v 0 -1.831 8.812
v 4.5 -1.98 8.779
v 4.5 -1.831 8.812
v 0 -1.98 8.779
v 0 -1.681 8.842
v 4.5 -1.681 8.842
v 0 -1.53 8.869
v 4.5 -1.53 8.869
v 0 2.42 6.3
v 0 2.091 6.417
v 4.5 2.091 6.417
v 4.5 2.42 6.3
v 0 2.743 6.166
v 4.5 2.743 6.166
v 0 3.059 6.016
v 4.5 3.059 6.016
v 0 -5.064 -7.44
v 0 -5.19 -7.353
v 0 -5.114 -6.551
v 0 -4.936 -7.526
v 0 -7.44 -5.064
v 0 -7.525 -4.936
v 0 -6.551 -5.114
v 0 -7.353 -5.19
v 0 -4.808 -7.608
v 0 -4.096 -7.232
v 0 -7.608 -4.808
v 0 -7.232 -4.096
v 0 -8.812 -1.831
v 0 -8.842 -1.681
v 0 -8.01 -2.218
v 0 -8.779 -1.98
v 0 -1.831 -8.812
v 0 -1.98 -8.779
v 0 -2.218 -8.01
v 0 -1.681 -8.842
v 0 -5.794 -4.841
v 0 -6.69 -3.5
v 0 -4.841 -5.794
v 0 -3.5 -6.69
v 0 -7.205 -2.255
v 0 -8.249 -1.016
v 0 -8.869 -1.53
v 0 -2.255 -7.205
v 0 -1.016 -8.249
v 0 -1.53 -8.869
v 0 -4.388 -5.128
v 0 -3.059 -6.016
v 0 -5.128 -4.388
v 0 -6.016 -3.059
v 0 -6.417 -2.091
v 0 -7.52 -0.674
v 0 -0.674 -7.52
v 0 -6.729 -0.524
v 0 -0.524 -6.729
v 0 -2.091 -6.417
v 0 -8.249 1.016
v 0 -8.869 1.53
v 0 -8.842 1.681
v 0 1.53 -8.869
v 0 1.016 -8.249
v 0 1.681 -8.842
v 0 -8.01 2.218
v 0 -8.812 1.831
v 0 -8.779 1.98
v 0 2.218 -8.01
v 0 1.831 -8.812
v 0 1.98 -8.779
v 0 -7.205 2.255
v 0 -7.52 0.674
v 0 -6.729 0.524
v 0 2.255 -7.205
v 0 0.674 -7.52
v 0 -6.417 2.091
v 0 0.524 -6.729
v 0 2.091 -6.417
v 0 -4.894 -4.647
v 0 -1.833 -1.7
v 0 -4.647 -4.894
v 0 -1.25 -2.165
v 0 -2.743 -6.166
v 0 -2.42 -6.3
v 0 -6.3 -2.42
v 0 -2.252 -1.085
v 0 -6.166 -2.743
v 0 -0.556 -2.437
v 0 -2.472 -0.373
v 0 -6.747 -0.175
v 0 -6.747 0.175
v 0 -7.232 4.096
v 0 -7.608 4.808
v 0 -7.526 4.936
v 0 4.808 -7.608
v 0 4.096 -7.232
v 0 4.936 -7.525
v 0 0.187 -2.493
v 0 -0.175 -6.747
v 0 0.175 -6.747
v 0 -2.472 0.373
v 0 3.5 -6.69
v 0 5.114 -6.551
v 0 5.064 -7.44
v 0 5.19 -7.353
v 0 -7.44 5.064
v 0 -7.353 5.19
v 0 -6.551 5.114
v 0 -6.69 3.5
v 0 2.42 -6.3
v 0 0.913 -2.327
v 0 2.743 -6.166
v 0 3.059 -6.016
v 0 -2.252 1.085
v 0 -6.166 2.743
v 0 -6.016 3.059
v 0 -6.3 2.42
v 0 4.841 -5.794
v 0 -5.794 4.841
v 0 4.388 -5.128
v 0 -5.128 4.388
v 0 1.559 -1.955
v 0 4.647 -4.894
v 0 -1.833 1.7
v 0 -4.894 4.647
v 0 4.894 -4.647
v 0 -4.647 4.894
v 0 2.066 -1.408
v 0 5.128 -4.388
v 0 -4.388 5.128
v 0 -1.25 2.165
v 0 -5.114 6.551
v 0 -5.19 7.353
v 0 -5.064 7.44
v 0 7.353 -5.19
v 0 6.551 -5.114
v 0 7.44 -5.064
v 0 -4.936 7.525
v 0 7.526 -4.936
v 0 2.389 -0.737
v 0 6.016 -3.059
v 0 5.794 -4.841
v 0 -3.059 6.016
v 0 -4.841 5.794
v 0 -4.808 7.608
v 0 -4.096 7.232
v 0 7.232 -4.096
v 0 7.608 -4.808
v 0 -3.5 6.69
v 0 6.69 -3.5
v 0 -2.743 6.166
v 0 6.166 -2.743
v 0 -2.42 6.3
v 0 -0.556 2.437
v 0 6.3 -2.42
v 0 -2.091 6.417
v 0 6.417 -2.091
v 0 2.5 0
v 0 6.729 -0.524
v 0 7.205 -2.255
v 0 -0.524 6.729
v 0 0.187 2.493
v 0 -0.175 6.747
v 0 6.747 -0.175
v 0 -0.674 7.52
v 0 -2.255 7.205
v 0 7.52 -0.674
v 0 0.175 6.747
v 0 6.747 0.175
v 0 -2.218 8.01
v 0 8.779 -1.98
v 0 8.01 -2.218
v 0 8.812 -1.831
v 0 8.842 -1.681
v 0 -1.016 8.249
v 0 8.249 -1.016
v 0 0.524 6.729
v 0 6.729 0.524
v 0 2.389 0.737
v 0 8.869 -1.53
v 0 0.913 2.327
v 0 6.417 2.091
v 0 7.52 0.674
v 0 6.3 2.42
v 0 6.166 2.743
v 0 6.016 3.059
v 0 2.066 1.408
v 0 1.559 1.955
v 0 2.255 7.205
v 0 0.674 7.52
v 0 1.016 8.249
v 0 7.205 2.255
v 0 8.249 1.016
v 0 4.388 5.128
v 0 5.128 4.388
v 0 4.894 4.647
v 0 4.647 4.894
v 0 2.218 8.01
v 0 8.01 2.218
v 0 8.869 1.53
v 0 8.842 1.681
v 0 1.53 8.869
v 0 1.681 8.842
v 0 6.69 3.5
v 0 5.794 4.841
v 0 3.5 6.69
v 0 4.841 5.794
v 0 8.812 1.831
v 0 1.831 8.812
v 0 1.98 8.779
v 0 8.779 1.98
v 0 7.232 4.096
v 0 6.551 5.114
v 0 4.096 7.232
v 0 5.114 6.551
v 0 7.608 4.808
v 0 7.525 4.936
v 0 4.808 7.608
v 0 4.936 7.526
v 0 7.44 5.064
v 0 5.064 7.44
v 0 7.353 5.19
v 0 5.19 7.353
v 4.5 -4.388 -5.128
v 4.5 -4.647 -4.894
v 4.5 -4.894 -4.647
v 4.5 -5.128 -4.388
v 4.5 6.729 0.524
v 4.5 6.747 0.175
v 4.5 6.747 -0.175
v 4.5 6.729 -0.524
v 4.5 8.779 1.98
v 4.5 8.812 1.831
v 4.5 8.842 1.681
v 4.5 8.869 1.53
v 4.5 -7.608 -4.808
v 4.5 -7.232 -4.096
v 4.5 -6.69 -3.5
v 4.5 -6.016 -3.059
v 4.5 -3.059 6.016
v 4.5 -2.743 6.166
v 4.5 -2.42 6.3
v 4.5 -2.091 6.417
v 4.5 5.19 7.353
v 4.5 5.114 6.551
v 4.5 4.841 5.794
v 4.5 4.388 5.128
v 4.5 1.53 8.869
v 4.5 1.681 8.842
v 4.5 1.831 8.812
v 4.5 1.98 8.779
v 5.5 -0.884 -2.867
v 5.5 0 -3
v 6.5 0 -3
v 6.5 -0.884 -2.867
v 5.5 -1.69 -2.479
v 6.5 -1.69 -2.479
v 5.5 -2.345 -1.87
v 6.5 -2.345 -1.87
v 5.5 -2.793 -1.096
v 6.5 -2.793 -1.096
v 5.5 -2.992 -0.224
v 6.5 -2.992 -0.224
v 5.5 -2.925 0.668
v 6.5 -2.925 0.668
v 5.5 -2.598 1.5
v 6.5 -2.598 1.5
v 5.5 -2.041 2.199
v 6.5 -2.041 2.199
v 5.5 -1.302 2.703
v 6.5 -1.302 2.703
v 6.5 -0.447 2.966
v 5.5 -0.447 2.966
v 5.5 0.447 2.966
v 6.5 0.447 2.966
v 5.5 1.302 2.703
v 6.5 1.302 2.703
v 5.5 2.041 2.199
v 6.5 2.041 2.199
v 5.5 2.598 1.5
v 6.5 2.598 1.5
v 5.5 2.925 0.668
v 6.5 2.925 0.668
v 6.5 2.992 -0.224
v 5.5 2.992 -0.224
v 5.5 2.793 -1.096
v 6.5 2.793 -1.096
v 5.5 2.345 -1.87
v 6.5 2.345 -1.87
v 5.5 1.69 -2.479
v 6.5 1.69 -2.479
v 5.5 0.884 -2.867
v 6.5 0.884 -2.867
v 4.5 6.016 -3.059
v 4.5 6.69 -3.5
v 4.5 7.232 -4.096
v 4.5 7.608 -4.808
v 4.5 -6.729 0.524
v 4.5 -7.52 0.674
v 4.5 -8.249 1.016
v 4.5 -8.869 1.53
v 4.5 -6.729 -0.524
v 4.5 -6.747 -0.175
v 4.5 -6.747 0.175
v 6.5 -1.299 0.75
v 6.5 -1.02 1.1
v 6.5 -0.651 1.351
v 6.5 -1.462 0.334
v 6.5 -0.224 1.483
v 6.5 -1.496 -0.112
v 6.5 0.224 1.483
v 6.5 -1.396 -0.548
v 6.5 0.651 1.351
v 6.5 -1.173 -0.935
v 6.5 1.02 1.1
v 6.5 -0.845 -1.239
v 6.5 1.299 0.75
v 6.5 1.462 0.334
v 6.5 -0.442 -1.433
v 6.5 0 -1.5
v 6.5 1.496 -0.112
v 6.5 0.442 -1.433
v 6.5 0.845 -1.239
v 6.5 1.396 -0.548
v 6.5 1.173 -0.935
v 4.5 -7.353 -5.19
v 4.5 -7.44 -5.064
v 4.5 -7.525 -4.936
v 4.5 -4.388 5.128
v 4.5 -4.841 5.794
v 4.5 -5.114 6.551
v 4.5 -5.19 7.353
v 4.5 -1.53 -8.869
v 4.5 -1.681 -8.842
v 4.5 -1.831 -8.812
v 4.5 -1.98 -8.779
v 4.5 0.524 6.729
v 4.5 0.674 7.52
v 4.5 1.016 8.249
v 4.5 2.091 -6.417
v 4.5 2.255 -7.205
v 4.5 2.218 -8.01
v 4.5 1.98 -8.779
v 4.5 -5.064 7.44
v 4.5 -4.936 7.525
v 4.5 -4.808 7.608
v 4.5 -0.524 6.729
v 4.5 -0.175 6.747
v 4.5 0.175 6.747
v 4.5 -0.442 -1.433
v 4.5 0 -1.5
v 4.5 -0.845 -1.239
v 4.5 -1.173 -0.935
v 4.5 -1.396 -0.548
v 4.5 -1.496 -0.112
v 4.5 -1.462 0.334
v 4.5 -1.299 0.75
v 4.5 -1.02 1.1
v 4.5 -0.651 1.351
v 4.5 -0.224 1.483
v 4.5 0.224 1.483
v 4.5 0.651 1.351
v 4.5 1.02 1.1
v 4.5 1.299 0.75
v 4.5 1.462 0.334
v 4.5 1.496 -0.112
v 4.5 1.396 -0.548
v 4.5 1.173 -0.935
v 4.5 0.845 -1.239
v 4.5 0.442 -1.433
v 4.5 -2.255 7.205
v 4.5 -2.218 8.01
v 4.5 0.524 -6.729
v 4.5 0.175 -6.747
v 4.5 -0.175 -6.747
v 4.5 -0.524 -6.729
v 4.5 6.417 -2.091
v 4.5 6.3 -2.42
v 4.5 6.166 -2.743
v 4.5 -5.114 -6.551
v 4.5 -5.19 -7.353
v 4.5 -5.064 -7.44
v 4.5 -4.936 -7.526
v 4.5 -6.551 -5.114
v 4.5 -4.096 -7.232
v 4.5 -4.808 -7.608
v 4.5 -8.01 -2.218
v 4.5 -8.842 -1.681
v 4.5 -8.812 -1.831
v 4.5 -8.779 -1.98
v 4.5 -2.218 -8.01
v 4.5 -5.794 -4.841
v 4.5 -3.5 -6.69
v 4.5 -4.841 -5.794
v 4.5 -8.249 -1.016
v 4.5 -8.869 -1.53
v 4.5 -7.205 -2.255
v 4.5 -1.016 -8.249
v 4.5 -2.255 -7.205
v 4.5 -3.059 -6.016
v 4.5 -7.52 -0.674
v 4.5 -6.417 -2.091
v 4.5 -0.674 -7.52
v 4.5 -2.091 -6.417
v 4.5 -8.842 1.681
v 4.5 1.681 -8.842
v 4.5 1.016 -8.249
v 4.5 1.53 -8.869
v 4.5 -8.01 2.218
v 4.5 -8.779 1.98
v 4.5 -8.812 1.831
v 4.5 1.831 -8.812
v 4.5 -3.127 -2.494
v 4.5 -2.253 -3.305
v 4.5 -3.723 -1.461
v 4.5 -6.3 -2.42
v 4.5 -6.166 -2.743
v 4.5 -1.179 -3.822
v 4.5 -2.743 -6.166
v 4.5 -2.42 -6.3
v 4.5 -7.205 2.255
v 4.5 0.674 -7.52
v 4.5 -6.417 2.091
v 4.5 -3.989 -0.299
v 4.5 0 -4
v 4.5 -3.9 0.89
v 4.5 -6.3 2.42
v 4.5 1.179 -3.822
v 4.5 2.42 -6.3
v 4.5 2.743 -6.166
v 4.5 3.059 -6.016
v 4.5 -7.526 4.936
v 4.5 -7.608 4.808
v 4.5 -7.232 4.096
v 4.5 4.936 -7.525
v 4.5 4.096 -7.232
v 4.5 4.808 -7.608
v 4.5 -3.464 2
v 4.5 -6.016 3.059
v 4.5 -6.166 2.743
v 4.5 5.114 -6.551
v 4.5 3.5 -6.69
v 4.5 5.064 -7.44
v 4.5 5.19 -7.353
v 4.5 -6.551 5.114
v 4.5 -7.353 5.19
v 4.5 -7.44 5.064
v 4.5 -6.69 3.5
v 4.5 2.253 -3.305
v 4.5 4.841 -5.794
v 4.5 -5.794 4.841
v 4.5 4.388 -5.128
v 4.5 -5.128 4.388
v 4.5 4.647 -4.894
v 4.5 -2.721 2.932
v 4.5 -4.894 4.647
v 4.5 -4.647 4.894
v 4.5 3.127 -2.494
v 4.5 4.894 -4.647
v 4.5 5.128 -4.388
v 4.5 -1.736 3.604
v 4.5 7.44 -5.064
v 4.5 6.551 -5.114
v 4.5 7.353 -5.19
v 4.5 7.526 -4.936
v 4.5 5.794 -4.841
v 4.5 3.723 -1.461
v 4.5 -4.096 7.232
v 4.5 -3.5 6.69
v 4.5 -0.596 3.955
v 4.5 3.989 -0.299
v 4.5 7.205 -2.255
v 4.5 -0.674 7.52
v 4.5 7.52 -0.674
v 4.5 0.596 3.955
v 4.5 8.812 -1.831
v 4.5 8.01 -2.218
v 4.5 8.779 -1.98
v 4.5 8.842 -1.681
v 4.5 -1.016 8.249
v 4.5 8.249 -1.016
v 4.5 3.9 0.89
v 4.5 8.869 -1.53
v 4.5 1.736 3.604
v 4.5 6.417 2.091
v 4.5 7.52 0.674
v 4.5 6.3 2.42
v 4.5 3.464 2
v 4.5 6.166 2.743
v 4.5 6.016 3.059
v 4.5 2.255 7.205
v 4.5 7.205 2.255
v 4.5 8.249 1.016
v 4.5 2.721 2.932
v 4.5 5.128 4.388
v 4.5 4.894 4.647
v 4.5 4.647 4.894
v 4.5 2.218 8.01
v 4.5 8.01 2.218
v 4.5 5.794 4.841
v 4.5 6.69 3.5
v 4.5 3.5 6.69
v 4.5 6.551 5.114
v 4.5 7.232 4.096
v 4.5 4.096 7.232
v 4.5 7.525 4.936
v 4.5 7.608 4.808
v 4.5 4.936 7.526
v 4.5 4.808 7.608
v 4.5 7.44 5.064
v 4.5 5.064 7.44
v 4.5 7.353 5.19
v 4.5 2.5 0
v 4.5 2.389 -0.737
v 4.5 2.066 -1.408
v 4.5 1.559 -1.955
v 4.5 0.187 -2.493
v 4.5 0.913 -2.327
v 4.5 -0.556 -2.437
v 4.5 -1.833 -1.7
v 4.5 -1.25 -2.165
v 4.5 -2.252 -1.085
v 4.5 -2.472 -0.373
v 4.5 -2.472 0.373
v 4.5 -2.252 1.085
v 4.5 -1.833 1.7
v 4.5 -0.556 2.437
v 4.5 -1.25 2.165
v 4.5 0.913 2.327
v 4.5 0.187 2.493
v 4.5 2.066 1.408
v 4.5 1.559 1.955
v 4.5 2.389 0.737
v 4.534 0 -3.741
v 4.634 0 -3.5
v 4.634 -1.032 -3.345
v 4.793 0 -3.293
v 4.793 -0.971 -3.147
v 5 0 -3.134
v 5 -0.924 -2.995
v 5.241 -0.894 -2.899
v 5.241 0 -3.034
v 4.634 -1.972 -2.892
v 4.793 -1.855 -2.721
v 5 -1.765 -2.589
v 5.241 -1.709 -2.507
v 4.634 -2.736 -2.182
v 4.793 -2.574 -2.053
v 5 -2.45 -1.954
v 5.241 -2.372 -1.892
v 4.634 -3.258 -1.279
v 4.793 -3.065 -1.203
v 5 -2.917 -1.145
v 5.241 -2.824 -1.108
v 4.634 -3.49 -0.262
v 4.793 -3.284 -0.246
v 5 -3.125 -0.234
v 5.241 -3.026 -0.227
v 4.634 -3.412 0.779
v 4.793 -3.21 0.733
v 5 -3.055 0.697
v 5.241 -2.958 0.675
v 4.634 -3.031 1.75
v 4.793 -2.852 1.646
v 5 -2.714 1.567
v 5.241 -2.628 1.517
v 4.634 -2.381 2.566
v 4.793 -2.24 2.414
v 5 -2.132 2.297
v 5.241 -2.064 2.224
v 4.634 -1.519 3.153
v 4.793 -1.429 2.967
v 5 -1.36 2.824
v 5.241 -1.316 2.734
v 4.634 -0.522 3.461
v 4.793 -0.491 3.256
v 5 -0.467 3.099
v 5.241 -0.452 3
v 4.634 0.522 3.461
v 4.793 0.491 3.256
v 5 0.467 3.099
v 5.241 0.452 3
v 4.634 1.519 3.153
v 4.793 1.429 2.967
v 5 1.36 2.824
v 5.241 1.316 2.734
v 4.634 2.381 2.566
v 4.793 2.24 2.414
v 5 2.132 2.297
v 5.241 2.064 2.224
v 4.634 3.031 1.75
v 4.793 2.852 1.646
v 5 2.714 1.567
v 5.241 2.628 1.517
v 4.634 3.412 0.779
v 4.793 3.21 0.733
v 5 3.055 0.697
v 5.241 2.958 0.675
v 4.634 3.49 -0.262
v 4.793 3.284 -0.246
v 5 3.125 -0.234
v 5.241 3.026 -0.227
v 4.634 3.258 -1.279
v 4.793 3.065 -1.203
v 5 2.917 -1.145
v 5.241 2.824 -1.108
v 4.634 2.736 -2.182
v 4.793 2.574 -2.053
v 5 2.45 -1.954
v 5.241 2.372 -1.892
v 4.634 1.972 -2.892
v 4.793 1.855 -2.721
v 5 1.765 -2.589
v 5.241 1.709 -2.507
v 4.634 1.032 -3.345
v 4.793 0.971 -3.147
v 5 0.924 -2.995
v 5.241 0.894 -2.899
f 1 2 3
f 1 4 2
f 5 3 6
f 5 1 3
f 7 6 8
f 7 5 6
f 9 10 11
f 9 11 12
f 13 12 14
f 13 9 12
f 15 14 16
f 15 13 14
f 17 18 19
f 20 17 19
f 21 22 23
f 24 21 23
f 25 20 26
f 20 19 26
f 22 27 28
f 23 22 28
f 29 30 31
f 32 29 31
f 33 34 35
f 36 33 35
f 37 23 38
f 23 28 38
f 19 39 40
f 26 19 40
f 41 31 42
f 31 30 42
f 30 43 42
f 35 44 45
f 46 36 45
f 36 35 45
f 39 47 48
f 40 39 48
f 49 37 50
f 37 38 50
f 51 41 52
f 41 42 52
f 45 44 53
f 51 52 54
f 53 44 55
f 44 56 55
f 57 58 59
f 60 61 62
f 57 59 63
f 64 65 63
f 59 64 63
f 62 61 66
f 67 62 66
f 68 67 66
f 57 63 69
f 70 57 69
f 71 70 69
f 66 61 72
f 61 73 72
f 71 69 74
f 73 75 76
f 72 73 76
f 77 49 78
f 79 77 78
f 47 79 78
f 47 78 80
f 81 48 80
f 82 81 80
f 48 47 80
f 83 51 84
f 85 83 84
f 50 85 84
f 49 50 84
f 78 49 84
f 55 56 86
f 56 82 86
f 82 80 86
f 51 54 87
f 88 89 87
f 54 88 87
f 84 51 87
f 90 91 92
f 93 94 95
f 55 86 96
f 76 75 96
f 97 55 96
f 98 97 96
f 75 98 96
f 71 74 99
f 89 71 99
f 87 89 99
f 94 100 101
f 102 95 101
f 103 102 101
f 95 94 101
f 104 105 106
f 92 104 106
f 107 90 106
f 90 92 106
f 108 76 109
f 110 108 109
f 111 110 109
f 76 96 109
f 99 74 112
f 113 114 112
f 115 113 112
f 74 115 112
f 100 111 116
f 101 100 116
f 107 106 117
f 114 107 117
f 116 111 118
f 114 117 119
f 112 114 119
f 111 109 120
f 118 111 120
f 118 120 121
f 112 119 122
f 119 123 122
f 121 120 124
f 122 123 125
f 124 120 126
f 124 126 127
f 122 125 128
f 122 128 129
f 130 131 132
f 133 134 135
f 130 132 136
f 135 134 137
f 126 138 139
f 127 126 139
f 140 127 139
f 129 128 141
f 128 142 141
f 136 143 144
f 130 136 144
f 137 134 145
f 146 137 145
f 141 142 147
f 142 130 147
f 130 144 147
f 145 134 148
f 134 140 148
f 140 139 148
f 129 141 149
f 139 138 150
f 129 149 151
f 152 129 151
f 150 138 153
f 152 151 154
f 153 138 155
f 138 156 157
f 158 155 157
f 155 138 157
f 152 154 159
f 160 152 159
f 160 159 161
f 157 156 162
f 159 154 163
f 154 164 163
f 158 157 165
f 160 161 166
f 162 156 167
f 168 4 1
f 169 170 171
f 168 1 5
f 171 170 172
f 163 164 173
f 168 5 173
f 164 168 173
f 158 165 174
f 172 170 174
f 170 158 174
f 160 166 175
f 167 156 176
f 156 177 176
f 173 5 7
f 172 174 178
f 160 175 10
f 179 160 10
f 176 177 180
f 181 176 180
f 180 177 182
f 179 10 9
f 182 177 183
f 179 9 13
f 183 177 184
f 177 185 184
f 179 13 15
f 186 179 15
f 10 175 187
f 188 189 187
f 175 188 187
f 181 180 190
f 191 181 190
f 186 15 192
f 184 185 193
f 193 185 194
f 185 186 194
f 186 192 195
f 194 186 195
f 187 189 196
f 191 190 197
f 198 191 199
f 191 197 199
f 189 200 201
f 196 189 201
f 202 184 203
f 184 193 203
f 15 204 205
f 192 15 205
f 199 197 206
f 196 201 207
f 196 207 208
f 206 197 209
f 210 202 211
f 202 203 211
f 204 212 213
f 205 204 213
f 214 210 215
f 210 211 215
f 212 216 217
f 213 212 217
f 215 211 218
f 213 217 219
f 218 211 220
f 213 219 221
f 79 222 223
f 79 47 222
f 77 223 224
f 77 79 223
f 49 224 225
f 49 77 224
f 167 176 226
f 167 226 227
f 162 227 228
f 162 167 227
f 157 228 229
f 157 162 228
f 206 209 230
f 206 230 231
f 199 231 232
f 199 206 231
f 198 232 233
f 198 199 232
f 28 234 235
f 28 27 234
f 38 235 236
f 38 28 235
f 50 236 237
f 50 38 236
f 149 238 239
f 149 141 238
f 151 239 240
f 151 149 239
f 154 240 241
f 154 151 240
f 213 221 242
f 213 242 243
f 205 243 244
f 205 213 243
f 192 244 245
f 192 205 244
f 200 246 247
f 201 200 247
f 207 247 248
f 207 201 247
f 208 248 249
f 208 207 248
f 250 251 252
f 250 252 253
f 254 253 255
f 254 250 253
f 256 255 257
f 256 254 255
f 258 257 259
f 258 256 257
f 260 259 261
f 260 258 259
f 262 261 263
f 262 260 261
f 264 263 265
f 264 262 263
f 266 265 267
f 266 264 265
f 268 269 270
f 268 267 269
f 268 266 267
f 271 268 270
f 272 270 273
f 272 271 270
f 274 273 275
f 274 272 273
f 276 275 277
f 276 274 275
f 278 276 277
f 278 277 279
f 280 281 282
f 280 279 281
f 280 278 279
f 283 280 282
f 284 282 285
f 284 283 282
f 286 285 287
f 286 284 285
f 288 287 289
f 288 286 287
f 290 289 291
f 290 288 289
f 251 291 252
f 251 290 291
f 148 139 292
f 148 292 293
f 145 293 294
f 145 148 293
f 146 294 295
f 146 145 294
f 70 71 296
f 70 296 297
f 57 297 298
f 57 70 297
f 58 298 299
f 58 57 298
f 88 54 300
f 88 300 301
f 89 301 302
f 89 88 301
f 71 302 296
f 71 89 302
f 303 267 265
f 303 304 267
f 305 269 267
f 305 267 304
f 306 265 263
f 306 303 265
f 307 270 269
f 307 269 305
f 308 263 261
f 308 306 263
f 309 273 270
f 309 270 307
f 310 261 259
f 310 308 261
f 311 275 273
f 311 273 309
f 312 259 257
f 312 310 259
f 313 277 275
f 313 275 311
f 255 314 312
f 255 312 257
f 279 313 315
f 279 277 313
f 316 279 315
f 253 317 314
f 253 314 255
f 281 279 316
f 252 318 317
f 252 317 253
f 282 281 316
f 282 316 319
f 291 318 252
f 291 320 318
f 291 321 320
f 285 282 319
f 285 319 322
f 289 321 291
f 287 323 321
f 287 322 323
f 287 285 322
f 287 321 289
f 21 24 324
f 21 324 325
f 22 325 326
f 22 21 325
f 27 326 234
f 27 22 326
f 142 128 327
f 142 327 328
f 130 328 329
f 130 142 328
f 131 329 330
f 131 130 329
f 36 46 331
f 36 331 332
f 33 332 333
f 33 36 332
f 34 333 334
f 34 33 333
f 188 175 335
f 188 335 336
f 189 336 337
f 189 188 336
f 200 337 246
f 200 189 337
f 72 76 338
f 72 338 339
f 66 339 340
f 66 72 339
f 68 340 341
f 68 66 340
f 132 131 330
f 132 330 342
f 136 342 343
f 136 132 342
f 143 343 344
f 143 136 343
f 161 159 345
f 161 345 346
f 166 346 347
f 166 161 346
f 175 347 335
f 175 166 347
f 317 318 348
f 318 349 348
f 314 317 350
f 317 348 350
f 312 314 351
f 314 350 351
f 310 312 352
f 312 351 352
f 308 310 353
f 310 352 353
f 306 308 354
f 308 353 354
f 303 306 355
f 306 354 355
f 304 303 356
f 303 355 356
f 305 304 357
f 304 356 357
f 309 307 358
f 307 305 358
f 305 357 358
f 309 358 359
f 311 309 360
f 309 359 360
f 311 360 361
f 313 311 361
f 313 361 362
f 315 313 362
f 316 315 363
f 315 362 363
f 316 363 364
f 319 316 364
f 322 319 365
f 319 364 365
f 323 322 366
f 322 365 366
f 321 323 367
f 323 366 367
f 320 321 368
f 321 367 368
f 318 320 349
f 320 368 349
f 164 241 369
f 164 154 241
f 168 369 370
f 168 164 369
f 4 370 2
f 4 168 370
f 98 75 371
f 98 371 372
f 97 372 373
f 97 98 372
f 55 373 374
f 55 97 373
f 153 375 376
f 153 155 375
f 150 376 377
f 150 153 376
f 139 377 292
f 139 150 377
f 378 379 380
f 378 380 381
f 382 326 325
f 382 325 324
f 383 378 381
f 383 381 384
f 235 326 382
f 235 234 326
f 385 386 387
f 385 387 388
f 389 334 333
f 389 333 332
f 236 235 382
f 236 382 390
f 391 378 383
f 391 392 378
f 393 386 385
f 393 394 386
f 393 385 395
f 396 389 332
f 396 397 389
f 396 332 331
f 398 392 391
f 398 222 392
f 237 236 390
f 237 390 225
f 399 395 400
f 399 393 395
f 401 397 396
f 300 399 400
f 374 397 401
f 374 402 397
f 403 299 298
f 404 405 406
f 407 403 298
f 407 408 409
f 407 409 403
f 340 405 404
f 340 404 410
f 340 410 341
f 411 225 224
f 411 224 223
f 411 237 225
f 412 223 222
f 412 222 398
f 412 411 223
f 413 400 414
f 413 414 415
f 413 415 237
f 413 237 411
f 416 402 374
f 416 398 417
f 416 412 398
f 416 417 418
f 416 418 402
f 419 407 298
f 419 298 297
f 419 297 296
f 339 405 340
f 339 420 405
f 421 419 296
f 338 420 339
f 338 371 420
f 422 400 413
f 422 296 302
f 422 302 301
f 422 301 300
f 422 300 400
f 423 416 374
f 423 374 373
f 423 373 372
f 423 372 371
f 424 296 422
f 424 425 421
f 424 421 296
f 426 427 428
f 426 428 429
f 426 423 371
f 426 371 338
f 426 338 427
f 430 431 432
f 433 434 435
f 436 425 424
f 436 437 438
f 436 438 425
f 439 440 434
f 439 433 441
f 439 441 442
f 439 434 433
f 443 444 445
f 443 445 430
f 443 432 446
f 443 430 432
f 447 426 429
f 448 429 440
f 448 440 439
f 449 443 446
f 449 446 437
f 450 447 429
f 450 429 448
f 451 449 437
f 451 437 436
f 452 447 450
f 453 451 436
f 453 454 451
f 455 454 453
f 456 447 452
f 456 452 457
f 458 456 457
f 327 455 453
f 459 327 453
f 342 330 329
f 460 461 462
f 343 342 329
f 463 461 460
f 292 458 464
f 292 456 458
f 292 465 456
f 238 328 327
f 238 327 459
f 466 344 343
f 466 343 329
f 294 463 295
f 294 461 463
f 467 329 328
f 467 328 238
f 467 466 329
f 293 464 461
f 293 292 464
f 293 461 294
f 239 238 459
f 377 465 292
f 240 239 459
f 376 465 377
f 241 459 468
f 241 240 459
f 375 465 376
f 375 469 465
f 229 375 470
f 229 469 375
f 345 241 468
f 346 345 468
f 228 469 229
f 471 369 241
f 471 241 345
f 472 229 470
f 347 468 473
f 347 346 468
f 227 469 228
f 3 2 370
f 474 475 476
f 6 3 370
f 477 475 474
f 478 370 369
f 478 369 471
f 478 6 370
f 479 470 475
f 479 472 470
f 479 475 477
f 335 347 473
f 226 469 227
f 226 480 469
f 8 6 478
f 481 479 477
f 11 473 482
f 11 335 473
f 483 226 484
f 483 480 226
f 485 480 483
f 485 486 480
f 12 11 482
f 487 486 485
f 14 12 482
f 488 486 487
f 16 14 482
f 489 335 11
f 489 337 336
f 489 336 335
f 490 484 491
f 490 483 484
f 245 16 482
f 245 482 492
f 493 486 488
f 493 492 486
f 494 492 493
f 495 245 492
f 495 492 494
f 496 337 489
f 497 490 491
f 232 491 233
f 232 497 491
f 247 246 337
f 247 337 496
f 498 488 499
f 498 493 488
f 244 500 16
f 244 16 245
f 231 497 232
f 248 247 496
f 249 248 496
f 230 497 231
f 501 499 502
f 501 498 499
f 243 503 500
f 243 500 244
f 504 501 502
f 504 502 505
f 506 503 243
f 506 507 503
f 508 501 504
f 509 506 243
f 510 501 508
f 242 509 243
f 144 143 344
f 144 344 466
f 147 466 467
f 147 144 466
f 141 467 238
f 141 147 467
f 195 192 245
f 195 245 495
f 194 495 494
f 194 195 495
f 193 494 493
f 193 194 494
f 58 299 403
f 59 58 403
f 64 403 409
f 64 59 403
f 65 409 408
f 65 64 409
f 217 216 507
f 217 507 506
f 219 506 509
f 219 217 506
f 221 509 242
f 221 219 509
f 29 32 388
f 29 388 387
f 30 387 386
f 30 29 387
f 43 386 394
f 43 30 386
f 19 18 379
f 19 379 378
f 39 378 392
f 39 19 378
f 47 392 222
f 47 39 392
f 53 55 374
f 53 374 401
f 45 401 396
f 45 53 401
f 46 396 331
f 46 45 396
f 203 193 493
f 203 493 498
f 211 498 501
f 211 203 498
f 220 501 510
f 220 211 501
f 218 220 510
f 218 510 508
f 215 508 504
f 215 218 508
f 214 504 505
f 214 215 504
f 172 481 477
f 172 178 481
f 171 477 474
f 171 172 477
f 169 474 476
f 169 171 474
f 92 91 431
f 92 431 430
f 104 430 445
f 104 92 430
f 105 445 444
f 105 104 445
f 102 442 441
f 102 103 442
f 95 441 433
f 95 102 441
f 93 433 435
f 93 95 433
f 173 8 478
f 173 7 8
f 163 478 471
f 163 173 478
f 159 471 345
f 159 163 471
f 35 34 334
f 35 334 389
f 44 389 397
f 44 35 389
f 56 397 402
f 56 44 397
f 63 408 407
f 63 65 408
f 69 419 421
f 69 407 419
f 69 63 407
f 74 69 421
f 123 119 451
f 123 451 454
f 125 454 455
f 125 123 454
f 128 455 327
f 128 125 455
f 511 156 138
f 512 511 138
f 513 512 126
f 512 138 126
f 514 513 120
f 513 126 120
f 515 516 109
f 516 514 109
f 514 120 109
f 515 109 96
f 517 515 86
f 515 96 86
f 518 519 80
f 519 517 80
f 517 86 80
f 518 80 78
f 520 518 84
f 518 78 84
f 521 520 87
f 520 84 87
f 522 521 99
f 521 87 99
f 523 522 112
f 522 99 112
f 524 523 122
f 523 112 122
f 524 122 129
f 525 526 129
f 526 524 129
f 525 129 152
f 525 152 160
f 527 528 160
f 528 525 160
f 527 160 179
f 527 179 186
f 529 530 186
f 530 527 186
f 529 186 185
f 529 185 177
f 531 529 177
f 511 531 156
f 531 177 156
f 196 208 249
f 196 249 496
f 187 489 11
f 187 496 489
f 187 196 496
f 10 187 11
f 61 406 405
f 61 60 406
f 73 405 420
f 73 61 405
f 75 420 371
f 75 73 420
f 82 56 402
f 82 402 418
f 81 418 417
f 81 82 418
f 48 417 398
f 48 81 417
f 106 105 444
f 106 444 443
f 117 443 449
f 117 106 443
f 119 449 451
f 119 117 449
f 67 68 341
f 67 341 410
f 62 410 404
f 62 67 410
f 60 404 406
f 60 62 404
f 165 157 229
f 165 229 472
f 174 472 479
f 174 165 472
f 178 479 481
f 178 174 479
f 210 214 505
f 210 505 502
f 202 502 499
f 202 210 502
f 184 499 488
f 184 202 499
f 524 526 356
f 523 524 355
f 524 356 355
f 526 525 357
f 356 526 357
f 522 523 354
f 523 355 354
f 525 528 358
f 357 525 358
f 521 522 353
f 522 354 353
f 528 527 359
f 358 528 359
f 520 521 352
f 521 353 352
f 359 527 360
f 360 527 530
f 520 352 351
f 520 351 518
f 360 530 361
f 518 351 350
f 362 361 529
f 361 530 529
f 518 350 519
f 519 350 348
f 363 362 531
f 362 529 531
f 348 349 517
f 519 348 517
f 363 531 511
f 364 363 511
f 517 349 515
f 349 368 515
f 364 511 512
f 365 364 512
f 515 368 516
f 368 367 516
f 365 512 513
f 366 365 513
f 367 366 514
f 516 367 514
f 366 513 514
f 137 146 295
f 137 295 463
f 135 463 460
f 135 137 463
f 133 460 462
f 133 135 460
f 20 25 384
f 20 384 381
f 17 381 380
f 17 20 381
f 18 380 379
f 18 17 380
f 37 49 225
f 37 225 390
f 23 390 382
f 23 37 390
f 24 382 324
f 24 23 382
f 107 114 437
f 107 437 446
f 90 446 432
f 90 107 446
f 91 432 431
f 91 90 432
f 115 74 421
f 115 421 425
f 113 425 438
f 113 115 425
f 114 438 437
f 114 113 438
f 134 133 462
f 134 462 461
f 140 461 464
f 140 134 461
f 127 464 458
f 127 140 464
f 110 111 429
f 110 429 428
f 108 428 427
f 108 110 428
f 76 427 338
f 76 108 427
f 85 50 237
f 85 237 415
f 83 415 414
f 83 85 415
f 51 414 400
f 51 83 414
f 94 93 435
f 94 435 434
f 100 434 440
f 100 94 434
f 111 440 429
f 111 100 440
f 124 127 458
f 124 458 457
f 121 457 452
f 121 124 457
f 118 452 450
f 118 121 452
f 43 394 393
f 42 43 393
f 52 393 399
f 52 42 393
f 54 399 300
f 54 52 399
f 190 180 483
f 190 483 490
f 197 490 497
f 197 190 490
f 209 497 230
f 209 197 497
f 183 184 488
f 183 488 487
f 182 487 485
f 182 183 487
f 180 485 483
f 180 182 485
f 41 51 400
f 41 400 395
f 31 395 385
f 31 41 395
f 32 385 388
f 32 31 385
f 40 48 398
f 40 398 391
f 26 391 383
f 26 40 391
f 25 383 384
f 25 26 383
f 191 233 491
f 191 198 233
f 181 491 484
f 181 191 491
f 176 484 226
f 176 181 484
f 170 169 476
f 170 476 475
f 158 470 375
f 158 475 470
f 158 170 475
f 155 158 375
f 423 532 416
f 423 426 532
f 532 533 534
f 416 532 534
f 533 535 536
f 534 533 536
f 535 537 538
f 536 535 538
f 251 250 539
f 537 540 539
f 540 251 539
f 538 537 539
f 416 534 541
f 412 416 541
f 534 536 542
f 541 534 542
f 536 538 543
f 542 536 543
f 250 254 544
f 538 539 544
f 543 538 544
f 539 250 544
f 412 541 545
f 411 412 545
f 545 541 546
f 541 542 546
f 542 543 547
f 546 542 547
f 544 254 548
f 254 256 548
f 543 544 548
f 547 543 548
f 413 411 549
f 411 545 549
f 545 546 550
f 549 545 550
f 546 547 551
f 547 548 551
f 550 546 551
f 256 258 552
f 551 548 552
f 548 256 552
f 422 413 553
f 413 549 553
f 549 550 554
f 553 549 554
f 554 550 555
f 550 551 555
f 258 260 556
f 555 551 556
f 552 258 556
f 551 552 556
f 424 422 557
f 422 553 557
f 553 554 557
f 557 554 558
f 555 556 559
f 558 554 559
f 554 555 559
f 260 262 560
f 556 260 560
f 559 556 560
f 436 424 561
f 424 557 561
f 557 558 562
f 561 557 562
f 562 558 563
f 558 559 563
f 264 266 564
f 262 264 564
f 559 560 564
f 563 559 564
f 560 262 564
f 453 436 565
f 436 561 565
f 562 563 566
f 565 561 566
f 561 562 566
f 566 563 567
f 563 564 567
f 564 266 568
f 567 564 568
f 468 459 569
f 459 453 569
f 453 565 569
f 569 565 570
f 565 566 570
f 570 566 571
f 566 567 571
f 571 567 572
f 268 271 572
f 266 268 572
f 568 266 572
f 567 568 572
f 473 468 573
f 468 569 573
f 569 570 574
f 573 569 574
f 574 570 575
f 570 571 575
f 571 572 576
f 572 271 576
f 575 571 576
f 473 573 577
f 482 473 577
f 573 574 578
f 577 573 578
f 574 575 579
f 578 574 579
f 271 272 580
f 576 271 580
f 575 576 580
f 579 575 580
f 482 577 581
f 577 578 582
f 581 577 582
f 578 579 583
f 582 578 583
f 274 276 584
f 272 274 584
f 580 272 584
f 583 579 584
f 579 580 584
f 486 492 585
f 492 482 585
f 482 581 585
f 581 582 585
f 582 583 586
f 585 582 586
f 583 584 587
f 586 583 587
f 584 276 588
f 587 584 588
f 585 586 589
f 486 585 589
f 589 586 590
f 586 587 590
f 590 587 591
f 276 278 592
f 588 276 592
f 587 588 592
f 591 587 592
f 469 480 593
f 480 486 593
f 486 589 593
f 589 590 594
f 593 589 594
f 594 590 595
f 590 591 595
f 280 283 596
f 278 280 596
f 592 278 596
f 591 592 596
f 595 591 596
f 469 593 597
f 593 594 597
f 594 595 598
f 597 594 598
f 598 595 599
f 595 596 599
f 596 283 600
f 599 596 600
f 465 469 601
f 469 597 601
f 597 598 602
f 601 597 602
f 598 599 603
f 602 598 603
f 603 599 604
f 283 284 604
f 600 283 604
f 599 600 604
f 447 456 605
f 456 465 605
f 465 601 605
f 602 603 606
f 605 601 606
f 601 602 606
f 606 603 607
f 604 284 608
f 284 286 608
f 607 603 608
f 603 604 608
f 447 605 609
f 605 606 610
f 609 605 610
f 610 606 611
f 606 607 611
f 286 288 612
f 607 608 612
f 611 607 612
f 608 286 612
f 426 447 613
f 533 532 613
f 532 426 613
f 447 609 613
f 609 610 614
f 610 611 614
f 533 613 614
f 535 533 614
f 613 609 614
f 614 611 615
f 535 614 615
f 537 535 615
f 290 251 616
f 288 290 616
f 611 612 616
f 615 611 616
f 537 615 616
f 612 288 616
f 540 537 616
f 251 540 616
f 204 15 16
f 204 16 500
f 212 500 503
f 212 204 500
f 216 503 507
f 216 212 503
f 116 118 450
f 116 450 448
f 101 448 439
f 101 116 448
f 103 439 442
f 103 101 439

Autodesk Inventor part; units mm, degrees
ref_plane "YZ Plane" through (0, 0, 0) normal (1, 0, 0) x (0, 1, 0)
ref_plane "XZ Plane" through (0, 0, 0) normal (0, 1, 0) x (-1, 0, 0)
ref_plane "XY Plane" through (0, 0, 0) normal (0, 0, 1) x (1, 0, 0)
sketch "Sketch1" plane through (0, 0, 0) normal (1, 0, 0) x (0, 1, 0)
  arc A0 (-4.3875, 5.1282) -> (-5.1282, 4.3875) centre (0, 0) ccw
  arc A1 (-5.1895, 7.3532) -> (-4.3875, 5.1282) centre (-1.9912, 7.249) ccw
  arc A2 (-3.0589, 6.016) -> (-4.8075, 7.6084) centre (-5.9352, 4.6137) ccw
  arc A3 (-4.8075, 7.6084) -> (-5.1895, 7.3532) centre (0, 0) ccw
  arc A4 (-2.091, 6.4169) -> (-3.0589, 6.016) centre (0, 0) ccw
  arc A5 (-1.9805, 8.7794) -> (-2.091, 6.4169) centre (0.9345, 7.4592) ccw
  arc A6 (-1.5299, 8.869) -> (-1.9805, 8.7794) centre (0, 0) ccw
  arc A7 (-0.5238, 6.7286) -> (-1.5299, 8.869) centre (-3.7179, 6.5338) ccw
  arc A8 (0.5238, 6.7286) -> (-0.5238, 6.7286) centre (0, 0) ccw
  arc A9 (1.5299, 8.869) -> (0.5238, 6.7286) centre (3.7179, 6.5338) ccw
  arc A10 (1.9805, 8.7794) -> (1.5299, 8.869) centre (0, 0) ccw
  arc A11 (2.091, 6.4169) -> (1.9805, 8.7794) centre (-0.9345, 7.4592) ccw
  arc A12 (3.0589, 6.016) -> (2.091, 6.4169) centre (0, 0) ccw
  arc A13 (4.8075, 7.6084) -> (3.0589, 6.016) centre (5.9352, 4.6137) ccw
  arc A14 (5.1895, 7.3532) -> (4.8075, 7.6084) centre (0, 0) ccw
  arc A15 (4.3875, 5.1282) -> (5.1895, 7.3532) centre (1.9912, 7.249) ccw
  arc A16 (5.1282, 4.3875) -> (4.3875, 5.1282) centre (0, 0) ccw
  arc A17 (7.3532, 5.1895) -> (5.1282, 4.3875) centre (7.249, 1.9912) ccw
  arc A18 (7.6084, 4.8075) -> (7.3532, 5.1895) centre (0, 0) ccw
  arc A19 (6.016, 3.0589) -> (7.6084, 4.8075) centre (4.6137, 5.9352) ccw
  arc A20 (6.4169, 2.091) -> (6.016, 3.0589) centre (0, 0) ccw
  arc A21 (8.7794, 1.9805) -> (6.4169, 2.091) centre (7.4592, -0.9345) ccw
  arc A22 (8.869, 1.5299) -> (8.7794, 1.9805) centre (0, 0) ccw
  arc A23 (6.7286, 0.5238) -> (8.869, 1.5299) centre (6.5338, 3.7179) ccw
  arc A24 (6.7286, -0.5238) -> (6.7286, 0.5238) centre (0, 0) ccw
  arc A25 (8.869, -1.5299) -> (6.7286, -0.5238) centre (6.5338, -3.7179) ccw
  arc A26 (8.7794, -1.9805) -> (8.869, -1.5299) centre (0, 0) ccw
  arc A27 (6.4169, -2.091) -> (8.7794, -1.9805) centre (7.4592, 0.9345) ccw
  arc A28 (6.016, -3.0589) -> (6.4169, -2.091) centre (0, 0) ccw
  arc A29 (7.6084, -4.8075) -> (6.016, -3.0589) centre (4.6137, -5.9352) ccw
  arc A30 (7.3532, -5.1895) -> (7.6084, -4.8075) centre (0, 0) ccw
  arc A31 (5.1282, -4.3875) -> (7.3532, -5.1895) centre (7.249, -1.9912) ccw
  arc A32 (4.3875, -5.1282) -> (5.1282, -4.3875) centre (0, 0) ccw
  arc A33 (5.1895, -7.3532) -> (4.3875, -5.1282) centre (1.9912, -7.249) ccw
  arc A34 (4.8075, -7.6084) -> (5.1895, -7.3532) centre (0, 0) ccw
  arc A35 (3.0589, -6.016) -> (4.8075, -7.6084) centre (5.9352, -4.6137) ccw
  arc A36 (-8.869, 1.5299) -> (-6.7286, 0.5238) centre (-6.5338, 3.7179) ccw
  arc A37 (-6.7286, 0.5238) -> (-6.7286, -0.5238) centre (0, 0) ccw
  arc A38 (-6.7286, -0.5238) -> (-8.869, -1.5299) centre (-6.5338, -3.7179) ccw
  arc A39 (-8.869, -1.5299) -> (-8.7794, -1.9805) centre (0, 0) ccw
  arc A40 (-8.7794, -1.9805) -> (-6.4169, -2.091) centre (-7.4592, 0.9345) ccw
  arc A41 (-6.4169, -2.091) -> (-6.016, -3.0589) centre (0, 0) ccw
  arc A42 (-6.016, -3.0589) -> (-7.6084, -4.8075) centre (-4.6137, -5.9352) ccw
  arc A43 (-7.6084, -4.8075) -> (-7.3532, -5.1895) centre (0, 0) ccw
  arc A44 (-7.3532, -5.1895) -> (-5.1282, -4.3875) centre (-7.249, -1.9912) ccw
  arc A45 (-5.1282, -4.3875) -> (-4.3875, -5.1282) centre (0, 0) ccw
  arc A46 (-4.3875, -5.1282) -> (-5.1895, -7.3532) centre (-1.9912, -7.249) ccw
  arc A47 (-5.1895, -7.3532) -> (-4.8075, -7.6084) centre (0, 0) ccw
  arc A48 (-4.8075, -7.6084) -> (-3.0589, -6.016) centre (-5.9352, -4.6137) ccw
  arc A49 (-3.0589, -6.016) -> (-2.091, -6.4169) centre (0, 0) ccw
  arc A50 (-2.091, -6.4169) -> (-1.9805, -8.7794) centre (0.9345, -7.4592) ccw
  arc A51 (-1.9805, -8.7794) -> (-1.5299, -8.869) centre (0, 0) ccw
  arc A52 (-1.5299, -8.869) -> (-0.5238, -6.7286) centre (-3.7179, -6.5338) ccw
  arc A53 (-0.5238, -6.7286) -> (0.5238, -6.7286) centre (0, 0) ccw
  arc A54 (0.5238, -6.7286) -> (1.5299, -8.869) centre (3.7179, -6.5338) ccw
  arc A55 (1.5299, -8.869) -> (1.9805, -8.7794) centre (0, 0) ccw
  arc A56 (1.9805, -8.7794) -> (2.091, -6.4169) centre (-0.9345, -7.4592) ccw
  arc A57 (2.091, -6.4169) -> (3.0589, -6.016) centre (0, 0) ccw
  arc A58 (3.0589, -6.016) -> (4.8075, -7.6084) centre (5.9352, -4.6137) ccw
  arc A59 (4.8075, -7.6084) -> (5.1895, -7.3532) centre (0, 0) ccw
  arc A60 (5.1895, -7.3532) -> (4.3875, -5.1282) centre (1.9912, -7.249) ccw
  arc A61 (4.3875, -5.1282) -> (5.1282, -4.3875) centre (0, 0) ccw
  arc A62 (5.1282, -4.3875) -> (7.3532, -5.1895) centre (7.249, -1.9912) ccw
  arc A63 (7.3532, -5.1895) -> (7.6084, -4.8075) centre (0, 0) ccw
  arc A64 (7.6084, -4.8075) -> (6.016, -3.0589) centre (4.6137, -5.9352) ccw
  arc A65 (6.016, -3.0589) -> (6.4169, -2.091) centre (0, 0) ccw
  arc A66 (6.4169, -2.091) -> (8.7794, -1.9805) centre (7.4592, 0.9345) ccw
  arc A67 (8.7794, -1.9805) -> (8.869, -1.5299) centre (0, 0) ccw
  arc A68 (8.869, -1.5299) -> (6.7286, -0.5238) centre (6.5338, -3.7179) ccw
  arc A69 (6.7286, -0.5238) -> (6.7286, 0.5238) centre (0, 0) ccw
  arc A70 (6.7286, 0.5238) -> (8.869, 1.5299) centre (6.5338, 3.7179) ccw
  arc A71 (8.869, 1.5299) -> (8.7794, 1.9805) centre (0, 0) ccw
  arc A72 (8.7794, 1.9805) -> (6.4169, 2.091) centre (7.4592, -0.9345) ccw
  arc A73 (6.4169, 2.091) -> (6.016, 3.0589) centre (0, 0) ccw
  arc A74 (6.016, 3.0589) -> (7.6084, 4.8075) centre (4.6137, 5.9352) ccw
  arc A75 (7.6084, 4.8075) -> (7.3532, 5.1895) centre (0, 0) ccw
  arc A76 (7.3532, 5.1895) -> (5.1282, 4.3875) centre (7.249, 1.9912) ccw
  arc A77 (5.1282, 4.3875) -> (4.3875, 5.1282) centre (0, 0) ccw
  arc A78 (4.3875, 5.1282) -> (5.1895, 7.3532) centre (1.9912, 7.249) ccw
  arc A79 (5.1895, 7.3532) -> (4.8075, 7.6084) centre (0, 0) ccw
  arc A80 (4.8075, 7.6084) -> (3.0589, 6.016) centre (5.9352, 4.6137) ccw
  arc A81 (3.0589, 6.016) -> (2.091, 6.4169) centre (0, 0) ccw
  arc A82 (2.091, 6.4169) -> (1.9805, 8.7794) centre (-0.9345, 7.4592) ccw
  arc A83 (1.9805, 8.7794) -> (1.5299, 8.869) centre (0, 0) ccw
  arc A84 (1.5299, 8.869) -> (0.5238, 6.7286) centre (3.7179, 6.5338) ccw
  arc A85 (0.5238, 6.7286) -> (-0.5238, 6.7286) centre (0, 0) ccw
  arc A86 (-0.5238, 6.7286) -> (-1.5299, 8.869) centre (-3.7179, 6.5338) ccw
  arc A87 (-1.5299, 8.869) -> (-1.9805, 8.7794) centre (0, 0) ccw
  arc A88 (-1.9805, 8.7794) -> (-2.091, 6.4169) centre (0.9345, 7.4592) ccw
  arc A89 (-2.091, 6.4169) -> (-3.0589, 6.016) centre (0, 0) ccw
  arc A90 (-3.0589, 6.016) -> (-4.8075, 7.6084) centre (-5.9352, 4.6137) ccw
  arc A91 (-4.8075, 7.6084) -> (-5.1895, 7.3532) centre (0, 0) ccw
  arc A92 (-5.1895, 7.3532) -> (-4.3875, 5.1282) centre (-1.9912, 7.249) ccw
  arc A93 (-4.3875, 5.1282) -> (-5.1282, 4.3875) centre (0, 0) ccw
  arc A94 (-5.1282, 4.3875) -> (-7.3532, 5.1895) centre (-7.249, 1.9912) ccw
  arc A95 (-7.3532, 5.1895) -> (-7.6084, 4.8075) centre (0, 0) ccw
  arc A96 (-7.6084, 4.8075) -> (-6.016, 3.0589) centre (-4.6137, 5.9352) ccw
  arc A97 (-6.016, 3.0589) -> (-6.4169, 2.091) centre (0, 0) ccw
  arc A98 (-6.4169, 2.091) -> (-8.7794, 1.9805) centre (-7.4592, -0.9345) ccw
  arc A99 (-8.7794, 1.9805) -> (-8.869, 1.5299) centre (0, 0) ccw
  circle A100 centre (0, 0) radius 2.5
  line L0 (0, 0) -> (2.25, 0)
  line L1 (-1.5245, 0) -> (0, 0)
  line L2 (0, 0) -> (0, -2.5981)
  point P0 (3.0589, -6.016)
  point P1 (-5.1282, 4.3875)
  dimension "d17" = 5
extrude "Extrusion1" add sketch "Sketch1" along normal blind 4.5
sketch "Sketch4" plane through (4.5, 0, 0) normal (1, 0, 0) x (0, 0, -1)
  circle A0 centre (0, 0) radius 1.5
  arc A1 (6.016, 3.0589) -> (7.6084, 4.8075) centre (4.6137, 5.9352) ccw projected
  arc A2 (7.6084, 4.8075) -> (7.3532, 5.1895) centre (0, 0) ccw projected
  arc A3 (7.3532, 5.1895) -> (5.1282, 4.3875) centre (7.249, 1.9912) ccw projected
  arc A4 (5.1282, 4.3875) -> (4.3875, 5.1282) centre (0, 0) ccw projected
  arc A5 (4.3875, 5.1282) -> (5.1895, 7.3532) centre (1.9912, 7.249) ccw projected
  arc A6 (5.1895, 7.3532) -> (4.8075, 7.6084) centre (0, 0) ccw projected
  arc A7 (4.8075, 7.6084) -> (3.0589, 6.016) centre (5.9352, 4.6137) ccw projected
  arc A8 (3.0589, 6.016) -> (2.091, 6.4169) centre (0, 0) ccw projected
  arc A9 (2.091, 6.4169) -> (1.9805, 8.7794) centre (-0.9345, 7.4592) ccw projected
  arc A10 (1.9805, 8.7794) -> (1.5299, 8.869) centre (0, 0) ccw projected
  arc A11 (1.5299, 8.869) -> (0.5238, 6.7286) centre (3.7179, 6.5338) ccw projected
  arc A12 (0.5238, 6.7286) -> (-0.5238, 6.7286) centre (0, 0) ccw projected
  arc A13 (-0.5238, 6.7286) -> (-1.5299, 8.869) centre (-3.7179, 6.5338) ccw projected
  arc A14 (-1.5299, 8.869) -> (-1.9805, 8.7794) centre (0, 0) ccw projected
  arc A15 (-1.9805, 8.7794) -> (-2.091, 6.4169) centre (0.9345, 7.4592) ccw projected
  arc A16 (-2.091, 6.4169) -> (-3.0589, 6.016) centre (0, 0) ccw projected
  arc A17 (-3.0589, 6.016) -> (-4.8075, 7.6084) centre (-5.9352, 4.6137) ccw projected
  arc A18 (-4.8075, 7.6084) -> (-5.1895, 7.3532) centre (0, 0) ccw projected
  arc A19 (-5.1895, 7.3532) -> (-4.3875, 5.1282) centre (-1.9912, 7.249) ccw projected
  arc A20 (-4.3875, 5.1282) -> (-5.1282, 4.3875) centre (0, 0) ccw projected
  arc A21 (-5.1282, 4.3875) -> (-7.3532, 5.1895) centre (-7.249, 1.9912) ccw projected
  arc A22 (-7.3532, 5.1895) -> (-7.6084, 4.8075) centre (0, 0) ccw projected
  arc A23 (-7.6084, 4.8075) -> (-6.016, 3.0589) centre (-4.6137, 5.9352) ccw projected
  arc A24 (-6.016, 3.0589) -> (-6.4169, 2.091) centre (0, 0) ccw projected
  arc A25 (-6.4169, 2.091) -> (-8.7794, 1.9805) centre (-7.4592, -0.9345) ccw projected
  arc A26 (-8.7794, 1.9805) -> (-8.869, 1.5299) centre (0, 0) ccw projected
  arc A27 (-8.869, 1.5299) -> (-6.7286, 0.5238) centre (-6.5338, 3.7179) ccw projected
  arc A28 (-6.7286, 0.5238) -> (-6.7286, -0.5238) centre (0, 0) ccw projected
  arc A29 (-6.7286, -0.5238) -> (-8.869, -1.5299) centre (-6.5338, -3.7179) ccw projected
  arc A30 (-8.869, -1.5299) -> (-8.7794, -1.9805) centre (0, 0) ccw projected
  arc A31 (-8.7794, -1.9805) -> (-6.4169, -2.091) centre (-7.4592, 0.9345) ccw projected
  arc A32 (-6.4169, -2.091) -> (-6.016, -3.0589) centre (0, 0) ccw projected
  arc A33 (-6.016, -3.0589) -> (-7.6084, -4.8075) centre (-4.6137, -5.9352) ccw projected
  arc A34 (-7.6084, -4.8075) -> (-7.3532, -5.1895) centre (0, 0) ccw projected
  arc A35 (-7.3532, -5.1895) -> (-5.1282, -4.3875) centre (-7.249, -1.9912) ccw projected
  arc A36 (-5.1282, -4.3875) -> (-4.3875, -5.1282) centre (0, 0) ccw projected
  arc A37 (-4.3875, -5.1282) -> (-5.1895, -7.3532) centre (-1.9912, -7.249) ccw projected
  arc A38 (-5.1895, -7.3532) -> (-4.8075, -7.6084) centre (0, 0) ccw projected
  arc A39 (-4.8075, -7.6084) -> (-3.0589, -6.016) centre (-5.9352, -4.6137) ccw projected
  arc A40 (-3.0589, -6.016) -> (-2.091, -6.4169) centre (0, 0) ccw projected
  arc A41 (-2.091, -6.4169) -> (-1.9805, -8.7794) centre (0.9345, -7.4592) ccw projected
  arc A42 (-1.9805, -8.7794) -> (-1.5299, -8.869) centre (0, 0) ccw projected
  arc A43 (-1.5299, -8.869) -> (-0.5238, -6.7286) centre (-3.7179, -6.5338) ccw projected
  arc A44 (-0.5238, -6.7286) -> (0.5238, -6.7286) centre (0, 0) ccw projected
  arc A45 (0.5238, -6.7286) -> (1.5299, -8.869) centre (3.7179, -6.5338) ccw projected
  arc A46 (1.5299, -8.869) -> (1.9805, -8.7794) centre (0, 0) ccw projected
  arc A47 (1.9805, -8.7794) -> (2.091, -6.4169) centre (-0.9345, -7.4592) ccw projected
  arc A48 (2.091, -6.4169) -> (3.0589, -6.016) centre (0, 0) ccw projected
  arc A49 (3.0589, -6.016) -> (4.8075, -7.6084) centre (5.9352, -4.6137) ccw projected
  arc A50 (4.8075, -7.6084) -> (5.1895, -7.3532) centre (0, 0) ccw projected
  arc A51 (5.1895, -7.3532) -> (4.3875, -5.1282) centre (1.9912, -7.249) ccw projected
  arc A52 (4.3875, -5.1282) -> (5.1282, -4.3875) centre (0, 0) ccw projected
  arc A53 (5.1282, -4.3875) -> (7.3532, -5.1895) centre (7.249, -1.9912) ccw projected
  arc A54 (7.3532, -5.1895) -> (7.6084, -4.8075) centre (0, 0) ccw projected
  arc A55 (7.6084, -4.8075) -> (6.016, -3.0589) centre (4.6137, -5.9352) ccw projected
  arc A56 (6.016, -3.0589) -> (6.4169, -2.091) centre (0, 0) ccw projected
  arc A57 (6.4169, -2.091) -> (8.7794, -1.9805) centre (7.4592, 0.9345) ccw projected
  arc A58 (8.7794, -1.9805) -> (8.869, -1.5299) centre (0, 0) ccw projected
  arc A59 (8.869, -1.5299) -> (6.7286, -0.5238) centre (6.5338, -3.7179) ccw projected
  arc A60 (6.7286, -0.5238) -> (6.7286, 0.5238) centre (0, 0) ccw projected
  arc A61 (6.7286, 0.5238) -> (8.869, 1.5299) centre (6.5338, 3.7179) ccw projected
  arc A62 (8.869, 1.5299) -> (8.7794, 1.9805) centre (0, 0) ccw projected
  arc A63 (8.7794, 1.9805) -> (6.4169, 2.091) centre (7.4592, -0.9345) ccw projected
  arc A64 (6.4169, 2.091) -> (6.016, 3.0589) centre (0, 0) ccw projected
  circle A65 centre (0, 0) radius 2.5 projected
  circle A66 centre (0, 0) radius 3
  dimension "d18" = 3
  dimension "d19" = 6
extrude "Extrusion3" add sketch "Sketch4" along normal blind 2 contours A65 | A66
fillet "Fillet1" radius 1 1 edges at (4.5, 0, 3)
equation "\"d17\" = d_agu"
equation "\"d_agu\" = 5"
properties part number "engrane_v3"
